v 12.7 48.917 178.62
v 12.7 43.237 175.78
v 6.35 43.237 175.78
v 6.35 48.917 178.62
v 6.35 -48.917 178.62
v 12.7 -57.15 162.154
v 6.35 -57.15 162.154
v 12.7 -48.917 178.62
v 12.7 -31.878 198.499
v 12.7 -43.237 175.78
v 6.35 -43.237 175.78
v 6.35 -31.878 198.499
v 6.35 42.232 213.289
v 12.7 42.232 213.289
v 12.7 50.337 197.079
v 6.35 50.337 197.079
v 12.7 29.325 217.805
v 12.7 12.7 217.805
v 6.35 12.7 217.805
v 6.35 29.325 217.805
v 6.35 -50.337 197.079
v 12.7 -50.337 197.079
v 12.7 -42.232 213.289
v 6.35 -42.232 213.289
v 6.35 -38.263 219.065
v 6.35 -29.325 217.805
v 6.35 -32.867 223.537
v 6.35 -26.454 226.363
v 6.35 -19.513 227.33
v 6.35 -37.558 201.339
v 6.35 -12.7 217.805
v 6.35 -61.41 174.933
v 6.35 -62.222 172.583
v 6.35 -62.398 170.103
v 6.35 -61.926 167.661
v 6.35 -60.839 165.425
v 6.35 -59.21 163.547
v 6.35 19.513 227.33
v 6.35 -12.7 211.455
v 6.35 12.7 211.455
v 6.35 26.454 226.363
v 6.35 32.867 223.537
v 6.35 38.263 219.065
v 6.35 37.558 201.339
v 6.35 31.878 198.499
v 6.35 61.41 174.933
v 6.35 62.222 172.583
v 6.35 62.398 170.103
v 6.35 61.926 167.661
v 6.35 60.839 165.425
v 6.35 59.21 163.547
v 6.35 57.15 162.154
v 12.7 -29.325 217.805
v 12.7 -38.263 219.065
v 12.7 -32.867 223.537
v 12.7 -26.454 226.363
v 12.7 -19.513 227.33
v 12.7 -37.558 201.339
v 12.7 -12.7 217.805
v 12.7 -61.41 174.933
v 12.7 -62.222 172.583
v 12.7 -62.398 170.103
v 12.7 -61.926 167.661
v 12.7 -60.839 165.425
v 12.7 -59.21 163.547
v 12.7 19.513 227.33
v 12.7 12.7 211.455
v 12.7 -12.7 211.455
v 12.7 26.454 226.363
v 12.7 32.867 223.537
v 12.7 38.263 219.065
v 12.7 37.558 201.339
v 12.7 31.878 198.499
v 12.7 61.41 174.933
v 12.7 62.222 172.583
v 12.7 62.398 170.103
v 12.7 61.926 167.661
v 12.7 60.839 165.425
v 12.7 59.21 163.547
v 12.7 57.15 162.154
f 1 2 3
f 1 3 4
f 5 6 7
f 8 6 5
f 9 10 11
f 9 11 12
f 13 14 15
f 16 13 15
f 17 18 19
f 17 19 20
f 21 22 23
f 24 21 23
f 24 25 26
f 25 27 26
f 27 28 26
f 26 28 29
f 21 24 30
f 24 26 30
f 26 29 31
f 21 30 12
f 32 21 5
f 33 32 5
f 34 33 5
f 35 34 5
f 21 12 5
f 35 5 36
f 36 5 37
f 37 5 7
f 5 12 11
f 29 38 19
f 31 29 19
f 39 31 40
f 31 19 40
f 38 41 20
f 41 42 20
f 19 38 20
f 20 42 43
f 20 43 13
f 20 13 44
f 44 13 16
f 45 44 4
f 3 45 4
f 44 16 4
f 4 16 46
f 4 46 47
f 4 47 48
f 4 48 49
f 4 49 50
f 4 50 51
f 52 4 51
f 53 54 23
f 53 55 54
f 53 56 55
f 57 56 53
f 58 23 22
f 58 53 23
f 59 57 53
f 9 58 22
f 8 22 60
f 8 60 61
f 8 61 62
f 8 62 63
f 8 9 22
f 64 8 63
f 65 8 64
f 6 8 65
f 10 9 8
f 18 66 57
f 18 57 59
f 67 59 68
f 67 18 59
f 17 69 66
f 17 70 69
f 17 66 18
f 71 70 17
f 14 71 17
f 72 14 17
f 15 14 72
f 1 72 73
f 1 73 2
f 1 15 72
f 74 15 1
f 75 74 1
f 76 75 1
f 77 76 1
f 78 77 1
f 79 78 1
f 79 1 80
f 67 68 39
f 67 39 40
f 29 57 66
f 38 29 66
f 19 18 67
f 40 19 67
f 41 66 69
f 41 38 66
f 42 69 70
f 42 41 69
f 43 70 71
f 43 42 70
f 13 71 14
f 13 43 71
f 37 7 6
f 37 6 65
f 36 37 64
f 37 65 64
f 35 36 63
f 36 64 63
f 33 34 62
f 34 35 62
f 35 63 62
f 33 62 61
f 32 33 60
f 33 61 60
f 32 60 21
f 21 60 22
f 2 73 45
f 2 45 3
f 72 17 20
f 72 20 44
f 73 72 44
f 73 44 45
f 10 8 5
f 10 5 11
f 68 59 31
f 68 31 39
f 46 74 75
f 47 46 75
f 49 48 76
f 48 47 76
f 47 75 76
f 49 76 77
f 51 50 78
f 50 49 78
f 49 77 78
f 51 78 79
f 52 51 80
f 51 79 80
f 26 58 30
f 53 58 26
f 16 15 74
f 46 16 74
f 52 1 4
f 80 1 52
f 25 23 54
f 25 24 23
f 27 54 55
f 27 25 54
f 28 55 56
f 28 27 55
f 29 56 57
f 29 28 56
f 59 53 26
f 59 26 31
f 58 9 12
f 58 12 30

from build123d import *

# Parameters (mm, degrees)
SKETCH1_R             = 7.9375
SKETCH1_R_2           = 11.1125
BOSS_EXTRUDE1_DEPTH   = 12.7
F_8_CLEARANCE_HOLE1_D = 4.4958
SKETCH5_R             = 18.415
CUT_EXTRUDE1_DEPTH    = 218.842023092
SKETCH7_R             = 9.525
CUT_EXTRUDE2_DEPTH    = 218.842023092
CUT_EXTRUDE3_DEPTH    = 218.842023092
BOSS_EXTRUDE2_DEPTH   = 12.7
CUT_EXTRUDE4_DEPTH    = 218.842023092
SKETCH11_W            = 12.7
SKETCH11_H            = 178.054
CUT_EXTRUDE5_DEPTH    = 3.175
BOSS_EXTRUDE3_DEPTH   = 6.35
CUT_EXTRUDE6_DEPTH    = 253.498549798
FILLET1_R             = 12.7
SKETCH16_W            = 6.35
SKETCH16_H            = 25.4
BOSS_EXTRUDE4_DEPTH   = 6.35
CUT_EXTRUDE7_DEPTH    = 253.258895086
FILLET2_R             = 9.525
FILLET3_R             = 25.4


with BuildPart() as part:
    # Sketch1 → Boss-Extrude1 (new body)
    with BuildSketch(Plane(origin=(0, 0, 0), x_dir=(0, 0, -1), z_dir=(1, 0, 0))):
        with BuildLine():
            Line((93.345, 0), (55.245, 50.8))
            Line((55.245, 50.8), (-160.655, 50.8))
            ThreePointArc((-160.655, 50.8), (-211.455, 0), (-160.655, -50.8))
            Line((-160.655, -50.8), (55.245, -50.8))
            Line((55.245, -50.8), (93.345, 0))
        make_face()
        with Locations((-88.9, 0)):
            Circle(SKETCH1_R, mode=Mode.SUBTRACT)
        with Locations((-38.1, 0)):
            Circle(SKETCH1_R, mode=Mode.SUBTRACT)
        with Locations((-160.655, 0)):
            Circle(SKETCH1_R_2, mode=Mode.SUBTRACT)
        Circle(SKETCH1_R, mode=Mode.SUBTRACT)
    extrude(amount=BOSS_EXTRUDE1_DEPTH)

    # #8 Clearance Hole1 (through all)
    with Locations(Plane.ZY):
        with Locations((-17.691104559, 17.691104559), (17.691104559, 17.691104559), (17.691104559, -17.691104559), (-17.691104559, -17.691104559)):
            Hole(F_8_CLEARANCE_HOLE1_D / 2)

    # Sketch5 → Cut-Extrude1 (cut, through all)
    with BuildSketch(Plane.ZY):
        Circle(SKETCH5_R)
    extrude(amount=-CUT_EXTRUDE1_DEPTH, mode=Mode.SUBTRACT)

    # Sketch7 → Cut-Extrude2 (cut, through all)
    with BuildSketch(Plane.ZY):
        with Locations((-55.245, 0)):
            Circle(SKETCH7_R)
    extrude(amount=-CUT_EXTRUDE2_DEPTH, mode=Mode.SUBTRACT)

    # Sketch8 → Cut-Extrude3 (cut, through all)
    with BuildSketch(Plane(origin=(12.7, 0, 0), x_dir=(0, 0, -1), z_dir=(1, 0, 0))):
        Polygon((-160.655, 50.8), (-211.455, 25.4), (-211.455, -25.4), (-160.655, -50.8), (-233.239745749, -50.8), (-233.239745749, 50.8), align=None)
    extrude(amount=-CUT_EXTRUDE3_DEPTH, mode=Mode.SUBTRACT)

    # Sketch9 → Boss-Extrude2 (add)
    with BuildSketch(Plane(origin=(12.7, 0, 0), x_dir=(0, 0, -1), z_dir=(1, 0, 0))):
        Polygon((-160.655, 50.8), (-211.455, 25.4), (-211.455, 0), (-211.455, -25.4), (-160.655, -50.8), (-160.655, -40.64), (-202.749323348, 0), (-160.655, 40.64), align=None)
    extrude(amount=-BOSS_EXTRUDE2_DEPTH)

    # Sketch10 → Cut-Extrude4 (cut, through all)
    with BuildSketch(Plane.ZY):
        Polygon((-79.0575, -19.05), (-79.0575, 19.05), (-93.345, 0), align=None)
    extrude(amount=-CUT_EXTRUDE4_DEPTH, mode=Mode.SUBTRACT)

    # Sketch11 → Cut-Extrude5 (cut)
    with BuildSketch(Plane(origin=(0, 50.8, 0), x_dir=(1, 0, 0), z_dir=(0, 1, 0))):
        with Locations((6.35, -52.705)):
            Rectangle(SKETCH11_W, SKETCH11_H)
    cut_extrude5 = extrude(amount=-CUT_EXTRUDE5_DEPTH, mode=Mode.SUBTRACT)

    # Mirror1: Cut-Extrude5 across plane
    add(cut_extrude5.mirror(Plane.ZX), mode=Mode.SUBTRACT)

    # Sketch13 → Cut-Extrude6 (cut, through all)
    with BuildSketch(Plane(origin=(12.7, 0, 0), x_dir=(0, 0, -1), z_dir=(1, 0, 0))):
        Polygon((-161.254612663, -53.34), (-139.192, -53.34), (-139.192, -50.165), (33.782, -50.165), (33.782, -53.34), (56.515, -53.34), (81.5975, -19.896666667), (81.5975, 19.896666667), (56.515, 53.34), (33.782, 53.34), (33.782, 50.165), (-139.192, 50.165), (-139.192, 53.34), (-161.254612663, 53.34), (-213.995, 26.969806331), (-213.995, -26.969806331), align=None)
    extrude(amount=-CUT_EXTRUDE6_DEPTH, mode=Mode.SUBTRACT)


with BuildPart() as body_2:
    # Sketch12 → Boss-Extrude3 (new body)
    with BuildSketch(Plane(origin=(12.7, 0, 0), x_dir=(0, 0, -1), z_dir=(1, 0, 0))):
        with BuildLine():
            ThreePointArc((-211.89681554, -56.397839854), (-236.855, 0), (-211.89681554, 56.397839854))
            Line((-211.89681554, 56.397839854), (-243.205, 43.989212666))
            Line((-243.205, 43.989212666), (-243.205, -43.989212666))
            Line((-243.205, -43.989212666), (-211.89681554, -56.397839854))
        make_face()
        with BuildLine():
            Line((-217.805, 29.324515829), (-162.154031657, 57.15))
            Line((-162.154031657, 57.15), (-166.916531657, 66.675))
            Line((-166.916531657, 66.675), (-185.966531657, 66.675))
            Line((-185.966531657, 66.675), (-211.89681554, 56.397839854))
            ThreePointArc((-211.89681554, 56.397839854), (-236.855, 0), (-211.89681554, -56.397839854))
            Line((-211.89681554, -56.397839854), (-185.966531657, -66.675))
            Line((-185.966531657, -66.675), (-166.916531657, -66.675))
            Line((-166.916531657, -66.675), (-162.154031657, -57.15))
            Line((-162.154031657, -57.15), (-217.805, -29.324515829))
            Line((-217.805, -29.324515829), (-217.805, 29.324515829))
        make_face()
    extrude(amount=-BOSS_EXTRUDE3_DEPTH)

    # Fillet1
    fillet1_edges = [body_2.edges().sort_by_distance(p)[0] for p in [
        (9.525, -43.989212666, 243.205),
        (9.525, 43.989212666, 243.205),
        (9.525, 66.675, 185.966531657),
        (9.525, 66.675, 166.916531657),
        (9.525, -66.675, 166.916531657),
        (9.525, -66.675, 185.966531657),
    ]]
    fillet(fillet1_edges, radius=FILLET1_R)

    # Sketch16 → Boss-Extrude4 (add)
    with BuildSketch(Plane(origin=(12.7, 0, 0), x_dir=(0, 0, -1), z_dir=(1, 0, 0))):
        with Locations((-214.63, 0)):
            Rectangle(SKETCH16_W, SKETCH16_H)
        Polygon((-178.620290503, -48.916870577), (-175.780484171, -43.237257914), (-198.498934823, -31.878032589), (-201.338741154, -37.557645251), align=None)
        Polygon((-201.338741154, 37.557645251), (-198.498934823, 31.878032589), (-175.780484171, 43.237257914), (-178.620290503, 48.916870577), align=None)
    extrude(amount=-BOSS_EXTRUDE4_DEPTH)

    # Sketch17 → Cut-Extrude7 (cut, through all)
    with BuildSketch(Plane(origin=(12.7, 0, 0), x_dir=(0, 0, -1), z_dir=(1, 0, 0))):
        with BuildLine():
            Line((-174.765563314, 66.675), (-183.541544079, 66.675))
            ThreePointArc((-183.541544079, 66.675), (-185.923497883, 66.44962609), (-188.220911491, 65.781503319))
            Line((-188.220911491, 65.781503319), (-235.184367412, 47.168095163))
            ThreePointArc((-235.184367412, 47.168095163), (-241.010188388, 42.498188858), (-243.205, 35.361591844))
            Line((-243.205, 35.361591844), (-243.205, -35.361591844))
            ThreePointArc((-243.205, -35.361591844), (-241.010188388, -42.498188858), (-235.184367412, -47.168095163))
            Line((-235.184367412, -47.168095163), (-188.220911491, -65.781503319))
            ThreePointArc((-188.220911491, -65.781503319), (-185.923497883, -66.44962609), (-183.541544079, -66.675))
            Line((-183.541544079, -66.675), (-174.765563314, -66.675))
            ThreePointArc((-174.765563314, -66.675), (-171.322248813, -66.199303058), (-168.136883002, -64.80784807))
            Line((-168.136883002, -64.80784807), (-197.079031657, -50.336773743))
            Line((-197.079031657, -50.336773743), (-227.33, -35.211289571))
            Line((-227.33, -35.211289571), (-227.33, -3.175))
            Line((-227.33, -3.175), (-227.33, 3.175))
            Line((-227.33, 3.175), (-227.33, 35.211289571))
            Line((-227.33, 35.211289571), (-197.079031657, 50.336773743))
            Line((-197.079031657, 50.336773743), (-168.136883002, 64.80784807))
            ThreePointArc((-168.136883002, 64.80784807), (-171.322248813, 66.199303058), (-174.765563314, 66.675))
        make_face()
    extrude(amount=-CUT_EXTRUDE7_DEPTH, mode=Mode.SUBTRACT)

    # Fillet2
    # the kernel refuses this fillet: 9.525 mm, written as the material it takes off along each edge
    with BuildSketch(Plane(origin=(36.994694288, -64.80784807, 168.136883002), x_dir=(0, 0.4472135954999565, 0.8944271909999166), z_dir=(-1, 0, 0))) as fillet2_piece_1:
        with BuildLine():
            CenterArc((7.598468847, 9.525), FILLET2_R, 180, 90)
            Line((-1.926531153, 9.525), (-2.879031153, 9.525))
            ThreePointArc((-2.879031153, 9.525), (-2.879031153, 6.724757914), (-0.808010164, -0.504356844))
            Line((-0.808010164, -0.504356844), (0, -0.9525))
            Line((0, -0.9525), (7.598468847, -0.9525))
            Line((7.598468847, -0.9525), (7.598468847, 0))
        make_face()
    extrude(amount=54.939388575, mode=Mode.SUBTRACT)
    with BuildSketch(Plane(origin=(36.994694288, 64.80784807, 168.136883002), x_dir=(0, -0.447213595499958, 0.894427190999916), z_dir=(-1, 0, 0))) as fillet2_piece_2:
        with BuildLine():
            CenterArc((7.598468847, -9.525), FILLET2_R, 90, 90)
            Line((-1.926531153, -9.525), (-2.879031153, -9.525))
            ThreePointArc((-2.879031153, -9.525), (-2.879031153, -6.724757914), (-0.808010164, 0.504356844))
            Line((-0.808010164, 0.504356844), (0, 0.9525))
            Line((0, 0.9525), (7.598468847, 0.9525))
            Line((7.598468847, 0.9525), (7.598468847, 0))
        make_face()
    extrude(amount=54.939388575, mode=Mode.SUBTRACT)

    # Fillet3
    fillet3_edges = [body_2.edges().sort_by_distance(p)[0] for p in [
        (9.525, 35.211289571, 227.33),
        (9.525, -35.211289571, 227.33),
    ]]
    fillet(fillet3_edges, radius=FILLET3_R)


solid = body_2.part
